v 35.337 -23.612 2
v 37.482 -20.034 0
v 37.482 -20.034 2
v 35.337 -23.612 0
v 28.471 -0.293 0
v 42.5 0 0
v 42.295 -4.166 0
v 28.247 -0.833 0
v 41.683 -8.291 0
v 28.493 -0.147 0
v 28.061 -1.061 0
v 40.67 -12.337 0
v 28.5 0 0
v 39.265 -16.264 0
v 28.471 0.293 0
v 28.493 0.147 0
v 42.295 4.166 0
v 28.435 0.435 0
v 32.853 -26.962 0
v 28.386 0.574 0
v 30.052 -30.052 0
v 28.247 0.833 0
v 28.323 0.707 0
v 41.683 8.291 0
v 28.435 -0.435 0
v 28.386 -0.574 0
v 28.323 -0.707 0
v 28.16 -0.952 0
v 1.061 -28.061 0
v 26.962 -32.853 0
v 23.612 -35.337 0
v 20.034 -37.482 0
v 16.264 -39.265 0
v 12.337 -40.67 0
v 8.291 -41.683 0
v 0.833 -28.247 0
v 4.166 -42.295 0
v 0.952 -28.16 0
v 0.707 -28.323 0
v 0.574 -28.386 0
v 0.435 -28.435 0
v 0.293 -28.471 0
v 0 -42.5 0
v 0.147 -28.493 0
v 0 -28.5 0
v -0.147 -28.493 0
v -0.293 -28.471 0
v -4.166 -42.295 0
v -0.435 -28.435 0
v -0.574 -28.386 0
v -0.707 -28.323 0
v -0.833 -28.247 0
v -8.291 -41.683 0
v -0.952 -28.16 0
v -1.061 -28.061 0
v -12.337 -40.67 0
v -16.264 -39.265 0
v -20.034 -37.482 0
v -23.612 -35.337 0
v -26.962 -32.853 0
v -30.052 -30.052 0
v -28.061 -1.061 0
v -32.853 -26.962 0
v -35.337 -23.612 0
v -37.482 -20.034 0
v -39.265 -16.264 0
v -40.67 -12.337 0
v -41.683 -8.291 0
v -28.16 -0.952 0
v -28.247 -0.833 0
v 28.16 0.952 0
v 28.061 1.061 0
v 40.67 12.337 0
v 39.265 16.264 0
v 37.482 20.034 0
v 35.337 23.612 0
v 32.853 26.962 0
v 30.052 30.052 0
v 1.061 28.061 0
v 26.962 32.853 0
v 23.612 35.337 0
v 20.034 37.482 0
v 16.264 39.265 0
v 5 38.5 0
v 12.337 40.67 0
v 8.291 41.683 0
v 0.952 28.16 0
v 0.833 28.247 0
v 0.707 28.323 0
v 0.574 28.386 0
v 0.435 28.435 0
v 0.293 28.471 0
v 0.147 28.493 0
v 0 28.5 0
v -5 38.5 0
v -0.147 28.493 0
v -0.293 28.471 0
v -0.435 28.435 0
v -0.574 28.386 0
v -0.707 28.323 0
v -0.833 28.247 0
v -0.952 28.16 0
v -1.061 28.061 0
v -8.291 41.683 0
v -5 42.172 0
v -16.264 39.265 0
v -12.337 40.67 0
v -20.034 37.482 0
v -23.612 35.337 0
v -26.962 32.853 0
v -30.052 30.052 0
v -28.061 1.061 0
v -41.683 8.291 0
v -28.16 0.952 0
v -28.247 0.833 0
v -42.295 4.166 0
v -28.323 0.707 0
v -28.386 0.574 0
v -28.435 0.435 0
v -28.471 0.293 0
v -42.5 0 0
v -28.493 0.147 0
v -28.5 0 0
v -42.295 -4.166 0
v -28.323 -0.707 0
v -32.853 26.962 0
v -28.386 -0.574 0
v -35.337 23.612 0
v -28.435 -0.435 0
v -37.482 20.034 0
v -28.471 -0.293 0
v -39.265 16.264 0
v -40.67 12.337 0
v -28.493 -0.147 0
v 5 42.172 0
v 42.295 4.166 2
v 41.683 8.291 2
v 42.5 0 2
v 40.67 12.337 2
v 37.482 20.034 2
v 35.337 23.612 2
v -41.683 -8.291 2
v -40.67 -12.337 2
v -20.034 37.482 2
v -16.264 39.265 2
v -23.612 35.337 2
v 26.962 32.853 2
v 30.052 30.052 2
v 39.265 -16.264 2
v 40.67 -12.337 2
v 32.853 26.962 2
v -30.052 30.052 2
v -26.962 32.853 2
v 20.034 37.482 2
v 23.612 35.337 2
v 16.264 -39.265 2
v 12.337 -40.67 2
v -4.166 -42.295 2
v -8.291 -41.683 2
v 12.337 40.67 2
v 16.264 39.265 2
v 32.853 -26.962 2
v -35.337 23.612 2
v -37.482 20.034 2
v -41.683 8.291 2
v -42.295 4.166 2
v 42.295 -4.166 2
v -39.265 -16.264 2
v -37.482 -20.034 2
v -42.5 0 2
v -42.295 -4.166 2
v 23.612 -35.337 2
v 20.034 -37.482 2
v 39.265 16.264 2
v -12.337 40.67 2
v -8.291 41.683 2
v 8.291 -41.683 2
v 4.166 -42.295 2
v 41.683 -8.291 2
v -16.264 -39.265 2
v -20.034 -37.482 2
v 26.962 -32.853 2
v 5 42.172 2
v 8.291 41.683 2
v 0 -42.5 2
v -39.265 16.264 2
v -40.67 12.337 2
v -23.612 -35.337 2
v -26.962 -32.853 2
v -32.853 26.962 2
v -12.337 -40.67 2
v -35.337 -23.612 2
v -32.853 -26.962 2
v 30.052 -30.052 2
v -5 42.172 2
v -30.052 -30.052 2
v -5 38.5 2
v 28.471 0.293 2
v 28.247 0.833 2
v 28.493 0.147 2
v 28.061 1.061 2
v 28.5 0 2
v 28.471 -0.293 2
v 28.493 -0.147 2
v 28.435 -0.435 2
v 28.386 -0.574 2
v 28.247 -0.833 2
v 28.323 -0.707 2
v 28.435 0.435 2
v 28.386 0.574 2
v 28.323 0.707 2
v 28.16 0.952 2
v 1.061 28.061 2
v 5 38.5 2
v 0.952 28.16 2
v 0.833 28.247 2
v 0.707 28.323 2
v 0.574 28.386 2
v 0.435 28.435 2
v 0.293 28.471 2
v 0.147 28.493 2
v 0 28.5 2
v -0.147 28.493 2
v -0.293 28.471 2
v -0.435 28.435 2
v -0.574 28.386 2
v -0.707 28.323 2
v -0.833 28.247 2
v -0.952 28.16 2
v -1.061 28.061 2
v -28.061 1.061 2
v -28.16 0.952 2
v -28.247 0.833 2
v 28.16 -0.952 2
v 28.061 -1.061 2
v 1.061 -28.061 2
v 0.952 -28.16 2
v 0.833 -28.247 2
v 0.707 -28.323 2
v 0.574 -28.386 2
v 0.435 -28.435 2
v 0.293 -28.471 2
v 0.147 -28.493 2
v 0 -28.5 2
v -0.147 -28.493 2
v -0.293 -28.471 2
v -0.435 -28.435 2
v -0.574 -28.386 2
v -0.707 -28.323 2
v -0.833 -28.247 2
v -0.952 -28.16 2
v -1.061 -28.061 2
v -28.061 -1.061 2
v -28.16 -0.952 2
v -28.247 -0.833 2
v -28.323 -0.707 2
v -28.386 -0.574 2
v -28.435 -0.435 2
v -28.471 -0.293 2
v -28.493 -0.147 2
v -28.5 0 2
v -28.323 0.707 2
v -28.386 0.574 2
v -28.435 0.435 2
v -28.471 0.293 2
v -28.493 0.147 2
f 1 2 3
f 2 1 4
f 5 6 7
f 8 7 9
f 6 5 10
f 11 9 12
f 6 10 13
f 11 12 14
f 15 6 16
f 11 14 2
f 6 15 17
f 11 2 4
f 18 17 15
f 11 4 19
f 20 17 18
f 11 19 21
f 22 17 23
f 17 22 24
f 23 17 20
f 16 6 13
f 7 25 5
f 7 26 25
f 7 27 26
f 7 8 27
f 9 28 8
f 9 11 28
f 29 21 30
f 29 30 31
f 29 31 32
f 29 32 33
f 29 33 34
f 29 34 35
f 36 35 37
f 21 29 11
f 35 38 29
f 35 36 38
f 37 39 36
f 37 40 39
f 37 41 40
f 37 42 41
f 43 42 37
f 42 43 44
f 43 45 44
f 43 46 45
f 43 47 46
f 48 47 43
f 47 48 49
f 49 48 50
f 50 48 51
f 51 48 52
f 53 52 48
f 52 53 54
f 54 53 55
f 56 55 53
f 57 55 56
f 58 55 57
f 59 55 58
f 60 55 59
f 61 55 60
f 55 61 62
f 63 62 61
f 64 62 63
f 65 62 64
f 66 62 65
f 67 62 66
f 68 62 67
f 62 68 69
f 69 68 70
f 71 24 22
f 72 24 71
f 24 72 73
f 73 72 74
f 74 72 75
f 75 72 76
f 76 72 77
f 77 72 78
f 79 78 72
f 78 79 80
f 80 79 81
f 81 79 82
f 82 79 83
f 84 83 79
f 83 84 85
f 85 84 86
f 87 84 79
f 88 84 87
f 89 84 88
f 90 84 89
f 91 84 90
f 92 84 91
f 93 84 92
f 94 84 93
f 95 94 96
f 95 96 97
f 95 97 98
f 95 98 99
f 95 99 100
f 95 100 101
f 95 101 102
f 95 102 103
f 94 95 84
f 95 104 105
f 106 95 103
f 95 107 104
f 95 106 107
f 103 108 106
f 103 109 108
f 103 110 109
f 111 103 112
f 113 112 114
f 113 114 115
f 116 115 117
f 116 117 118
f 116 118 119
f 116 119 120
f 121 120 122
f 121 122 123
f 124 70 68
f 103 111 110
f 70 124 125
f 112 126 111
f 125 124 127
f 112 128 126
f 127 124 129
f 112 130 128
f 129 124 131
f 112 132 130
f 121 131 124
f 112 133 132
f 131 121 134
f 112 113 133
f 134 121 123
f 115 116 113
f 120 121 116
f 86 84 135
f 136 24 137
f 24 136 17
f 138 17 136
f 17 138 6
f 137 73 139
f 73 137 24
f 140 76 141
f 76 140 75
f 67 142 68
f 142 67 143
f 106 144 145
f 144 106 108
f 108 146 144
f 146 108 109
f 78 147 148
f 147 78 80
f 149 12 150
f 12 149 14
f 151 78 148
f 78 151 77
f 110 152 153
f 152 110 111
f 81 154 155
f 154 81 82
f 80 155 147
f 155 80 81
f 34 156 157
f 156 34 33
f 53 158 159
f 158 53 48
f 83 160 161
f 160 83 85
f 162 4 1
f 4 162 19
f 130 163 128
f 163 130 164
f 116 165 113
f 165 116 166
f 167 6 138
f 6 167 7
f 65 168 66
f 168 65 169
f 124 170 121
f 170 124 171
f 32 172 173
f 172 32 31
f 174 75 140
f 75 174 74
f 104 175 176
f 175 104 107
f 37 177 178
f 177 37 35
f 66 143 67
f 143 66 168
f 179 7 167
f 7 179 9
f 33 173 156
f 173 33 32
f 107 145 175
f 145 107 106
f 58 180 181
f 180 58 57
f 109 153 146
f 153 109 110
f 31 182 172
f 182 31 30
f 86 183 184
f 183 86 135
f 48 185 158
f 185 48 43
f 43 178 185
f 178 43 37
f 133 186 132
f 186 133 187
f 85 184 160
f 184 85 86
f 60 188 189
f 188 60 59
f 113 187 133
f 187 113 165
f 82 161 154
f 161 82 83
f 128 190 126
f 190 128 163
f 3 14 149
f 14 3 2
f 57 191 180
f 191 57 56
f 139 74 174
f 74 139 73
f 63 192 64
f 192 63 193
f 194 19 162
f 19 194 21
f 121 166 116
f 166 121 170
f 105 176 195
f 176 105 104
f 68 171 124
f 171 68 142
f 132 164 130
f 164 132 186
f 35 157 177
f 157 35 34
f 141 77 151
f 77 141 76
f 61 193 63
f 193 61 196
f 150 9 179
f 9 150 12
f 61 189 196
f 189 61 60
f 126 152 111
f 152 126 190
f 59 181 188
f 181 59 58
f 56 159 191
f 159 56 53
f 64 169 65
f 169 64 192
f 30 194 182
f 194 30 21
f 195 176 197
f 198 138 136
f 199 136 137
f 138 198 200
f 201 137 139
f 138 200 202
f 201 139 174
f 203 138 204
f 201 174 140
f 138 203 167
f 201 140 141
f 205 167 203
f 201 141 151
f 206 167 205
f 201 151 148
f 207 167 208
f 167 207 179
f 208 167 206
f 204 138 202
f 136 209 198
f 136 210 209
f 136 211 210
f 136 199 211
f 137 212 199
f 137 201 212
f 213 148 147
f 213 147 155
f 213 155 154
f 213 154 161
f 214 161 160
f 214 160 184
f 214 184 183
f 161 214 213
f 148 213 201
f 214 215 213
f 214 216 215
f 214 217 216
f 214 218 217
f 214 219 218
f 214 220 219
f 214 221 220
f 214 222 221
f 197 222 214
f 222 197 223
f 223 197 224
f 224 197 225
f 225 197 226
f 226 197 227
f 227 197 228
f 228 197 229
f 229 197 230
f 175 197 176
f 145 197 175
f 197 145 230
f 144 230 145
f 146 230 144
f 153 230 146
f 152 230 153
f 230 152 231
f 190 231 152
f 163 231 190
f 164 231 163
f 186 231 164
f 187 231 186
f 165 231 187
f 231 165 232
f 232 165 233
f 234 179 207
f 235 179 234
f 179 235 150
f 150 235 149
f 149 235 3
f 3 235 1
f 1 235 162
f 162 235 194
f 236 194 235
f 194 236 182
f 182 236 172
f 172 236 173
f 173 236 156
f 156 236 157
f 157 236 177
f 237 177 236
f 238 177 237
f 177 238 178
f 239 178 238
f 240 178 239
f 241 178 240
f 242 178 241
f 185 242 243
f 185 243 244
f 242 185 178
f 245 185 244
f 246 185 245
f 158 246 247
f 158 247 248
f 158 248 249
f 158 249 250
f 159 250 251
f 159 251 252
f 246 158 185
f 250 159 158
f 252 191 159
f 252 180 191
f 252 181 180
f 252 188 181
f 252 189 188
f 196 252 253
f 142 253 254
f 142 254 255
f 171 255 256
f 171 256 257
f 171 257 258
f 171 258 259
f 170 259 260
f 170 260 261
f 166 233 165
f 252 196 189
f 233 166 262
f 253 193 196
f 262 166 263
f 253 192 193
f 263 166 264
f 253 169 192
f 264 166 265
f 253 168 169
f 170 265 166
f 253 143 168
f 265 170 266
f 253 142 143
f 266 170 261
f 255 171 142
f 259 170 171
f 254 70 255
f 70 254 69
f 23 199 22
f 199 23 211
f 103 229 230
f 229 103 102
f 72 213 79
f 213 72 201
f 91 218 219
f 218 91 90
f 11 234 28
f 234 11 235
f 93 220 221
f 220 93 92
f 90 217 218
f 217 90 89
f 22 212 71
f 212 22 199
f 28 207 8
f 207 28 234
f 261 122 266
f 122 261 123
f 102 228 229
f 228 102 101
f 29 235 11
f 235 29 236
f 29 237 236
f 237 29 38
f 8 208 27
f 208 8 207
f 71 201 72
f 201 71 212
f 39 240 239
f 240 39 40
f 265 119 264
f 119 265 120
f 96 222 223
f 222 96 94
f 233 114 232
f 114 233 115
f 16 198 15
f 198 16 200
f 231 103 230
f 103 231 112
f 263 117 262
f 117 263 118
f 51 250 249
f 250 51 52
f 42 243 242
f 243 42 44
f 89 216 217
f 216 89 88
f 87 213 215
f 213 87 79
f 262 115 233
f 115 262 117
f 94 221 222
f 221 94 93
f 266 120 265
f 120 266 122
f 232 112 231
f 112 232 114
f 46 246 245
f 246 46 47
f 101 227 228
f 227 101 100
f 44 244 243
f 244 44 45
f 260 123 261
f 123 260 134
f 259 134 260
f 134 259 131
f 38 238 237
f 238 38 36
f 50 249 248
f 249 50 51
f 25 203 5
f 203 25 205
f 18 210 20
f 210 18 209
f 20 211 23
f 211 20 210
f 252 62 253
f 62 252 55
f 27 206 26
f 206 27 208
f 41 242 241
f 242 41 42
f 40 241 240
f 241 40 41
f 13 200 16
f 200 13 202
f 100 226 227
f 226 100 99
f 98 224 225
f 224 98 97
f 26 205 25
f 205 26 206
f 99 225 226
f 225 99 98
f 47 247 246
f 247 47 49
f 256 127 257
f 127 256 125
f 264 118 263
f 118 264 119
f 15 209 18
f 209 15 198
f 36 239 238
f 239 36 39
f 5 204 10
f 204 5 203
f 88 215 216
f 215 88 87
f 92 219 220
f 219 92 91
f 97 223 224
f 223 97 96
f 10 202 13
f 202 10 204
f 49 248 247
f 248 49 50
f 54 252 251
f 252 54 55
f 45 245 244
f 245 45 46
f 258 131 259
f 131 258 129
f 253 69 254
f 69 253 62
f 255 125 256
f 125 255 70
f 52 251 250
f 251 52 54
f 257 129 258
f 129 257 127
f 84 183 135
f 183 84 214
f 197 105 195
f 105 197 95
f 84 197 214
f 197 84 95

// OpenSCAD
// Petri dish sowing template - flat disc with a 7 x 7 hole grid and a rim notch for orientation
// Units: mm. Print orientation: flat on the bed, z = 0 upward.

$fn = 64;

// ---- Disc ----
disc_d        = 85;    // disc outer diameter
disc_t        = 2;     // disc thickness

// ---- Hole grid ----
hole_n_x      = 7;     // holes along X
hole_n_y      = 7;     // holes along Y
hole_d        = 3;     // through-hole diameter
hole_pitch    = 9;     // centre-to-centre spacing
grid_overlap  = 0.01;  // small overlap so the grid hull fuses cleanly

// ---- Notch ----
notch_w       = 10;    // notch width along X
notch_d       = 4;     // notch depth into the rim along Y

// ---- Cut clearance ----
eps           = 0.5;   // extension of cutters past faces

difference() {
    // Main disc, centred in X/Y, resting on z = 0
    cylinder(d = disc_d, h = disc_t);

    // 7 x 7 hole grid, centred on the disc
    hull() {
        for (i = [0 : hole_n_x - 1])
            translate([-hole_pitch * (hole_n_x - 1) / 2 + i * hole_pitch, 0, 0])
                cylinder(d = hole_d, h = disc_t + 2 * eps);
        for (j = [0 : hole_n_y - 1])
            translate([0, -hole_pitch * (hole_n_y - 1) / 2 + j * hole_pitch, 0])
                cylinder(d = hole_d, h = disc_t + 2 * eps);
    }

    // Rectangular orientation notch on the +Y side, centred on Y
    translate([-notch_w / 2, disc_d / 2 - notch_d, -eps])
        cube([notch_w, notch_d + eps, disc_t + 2 * eps]);
}
